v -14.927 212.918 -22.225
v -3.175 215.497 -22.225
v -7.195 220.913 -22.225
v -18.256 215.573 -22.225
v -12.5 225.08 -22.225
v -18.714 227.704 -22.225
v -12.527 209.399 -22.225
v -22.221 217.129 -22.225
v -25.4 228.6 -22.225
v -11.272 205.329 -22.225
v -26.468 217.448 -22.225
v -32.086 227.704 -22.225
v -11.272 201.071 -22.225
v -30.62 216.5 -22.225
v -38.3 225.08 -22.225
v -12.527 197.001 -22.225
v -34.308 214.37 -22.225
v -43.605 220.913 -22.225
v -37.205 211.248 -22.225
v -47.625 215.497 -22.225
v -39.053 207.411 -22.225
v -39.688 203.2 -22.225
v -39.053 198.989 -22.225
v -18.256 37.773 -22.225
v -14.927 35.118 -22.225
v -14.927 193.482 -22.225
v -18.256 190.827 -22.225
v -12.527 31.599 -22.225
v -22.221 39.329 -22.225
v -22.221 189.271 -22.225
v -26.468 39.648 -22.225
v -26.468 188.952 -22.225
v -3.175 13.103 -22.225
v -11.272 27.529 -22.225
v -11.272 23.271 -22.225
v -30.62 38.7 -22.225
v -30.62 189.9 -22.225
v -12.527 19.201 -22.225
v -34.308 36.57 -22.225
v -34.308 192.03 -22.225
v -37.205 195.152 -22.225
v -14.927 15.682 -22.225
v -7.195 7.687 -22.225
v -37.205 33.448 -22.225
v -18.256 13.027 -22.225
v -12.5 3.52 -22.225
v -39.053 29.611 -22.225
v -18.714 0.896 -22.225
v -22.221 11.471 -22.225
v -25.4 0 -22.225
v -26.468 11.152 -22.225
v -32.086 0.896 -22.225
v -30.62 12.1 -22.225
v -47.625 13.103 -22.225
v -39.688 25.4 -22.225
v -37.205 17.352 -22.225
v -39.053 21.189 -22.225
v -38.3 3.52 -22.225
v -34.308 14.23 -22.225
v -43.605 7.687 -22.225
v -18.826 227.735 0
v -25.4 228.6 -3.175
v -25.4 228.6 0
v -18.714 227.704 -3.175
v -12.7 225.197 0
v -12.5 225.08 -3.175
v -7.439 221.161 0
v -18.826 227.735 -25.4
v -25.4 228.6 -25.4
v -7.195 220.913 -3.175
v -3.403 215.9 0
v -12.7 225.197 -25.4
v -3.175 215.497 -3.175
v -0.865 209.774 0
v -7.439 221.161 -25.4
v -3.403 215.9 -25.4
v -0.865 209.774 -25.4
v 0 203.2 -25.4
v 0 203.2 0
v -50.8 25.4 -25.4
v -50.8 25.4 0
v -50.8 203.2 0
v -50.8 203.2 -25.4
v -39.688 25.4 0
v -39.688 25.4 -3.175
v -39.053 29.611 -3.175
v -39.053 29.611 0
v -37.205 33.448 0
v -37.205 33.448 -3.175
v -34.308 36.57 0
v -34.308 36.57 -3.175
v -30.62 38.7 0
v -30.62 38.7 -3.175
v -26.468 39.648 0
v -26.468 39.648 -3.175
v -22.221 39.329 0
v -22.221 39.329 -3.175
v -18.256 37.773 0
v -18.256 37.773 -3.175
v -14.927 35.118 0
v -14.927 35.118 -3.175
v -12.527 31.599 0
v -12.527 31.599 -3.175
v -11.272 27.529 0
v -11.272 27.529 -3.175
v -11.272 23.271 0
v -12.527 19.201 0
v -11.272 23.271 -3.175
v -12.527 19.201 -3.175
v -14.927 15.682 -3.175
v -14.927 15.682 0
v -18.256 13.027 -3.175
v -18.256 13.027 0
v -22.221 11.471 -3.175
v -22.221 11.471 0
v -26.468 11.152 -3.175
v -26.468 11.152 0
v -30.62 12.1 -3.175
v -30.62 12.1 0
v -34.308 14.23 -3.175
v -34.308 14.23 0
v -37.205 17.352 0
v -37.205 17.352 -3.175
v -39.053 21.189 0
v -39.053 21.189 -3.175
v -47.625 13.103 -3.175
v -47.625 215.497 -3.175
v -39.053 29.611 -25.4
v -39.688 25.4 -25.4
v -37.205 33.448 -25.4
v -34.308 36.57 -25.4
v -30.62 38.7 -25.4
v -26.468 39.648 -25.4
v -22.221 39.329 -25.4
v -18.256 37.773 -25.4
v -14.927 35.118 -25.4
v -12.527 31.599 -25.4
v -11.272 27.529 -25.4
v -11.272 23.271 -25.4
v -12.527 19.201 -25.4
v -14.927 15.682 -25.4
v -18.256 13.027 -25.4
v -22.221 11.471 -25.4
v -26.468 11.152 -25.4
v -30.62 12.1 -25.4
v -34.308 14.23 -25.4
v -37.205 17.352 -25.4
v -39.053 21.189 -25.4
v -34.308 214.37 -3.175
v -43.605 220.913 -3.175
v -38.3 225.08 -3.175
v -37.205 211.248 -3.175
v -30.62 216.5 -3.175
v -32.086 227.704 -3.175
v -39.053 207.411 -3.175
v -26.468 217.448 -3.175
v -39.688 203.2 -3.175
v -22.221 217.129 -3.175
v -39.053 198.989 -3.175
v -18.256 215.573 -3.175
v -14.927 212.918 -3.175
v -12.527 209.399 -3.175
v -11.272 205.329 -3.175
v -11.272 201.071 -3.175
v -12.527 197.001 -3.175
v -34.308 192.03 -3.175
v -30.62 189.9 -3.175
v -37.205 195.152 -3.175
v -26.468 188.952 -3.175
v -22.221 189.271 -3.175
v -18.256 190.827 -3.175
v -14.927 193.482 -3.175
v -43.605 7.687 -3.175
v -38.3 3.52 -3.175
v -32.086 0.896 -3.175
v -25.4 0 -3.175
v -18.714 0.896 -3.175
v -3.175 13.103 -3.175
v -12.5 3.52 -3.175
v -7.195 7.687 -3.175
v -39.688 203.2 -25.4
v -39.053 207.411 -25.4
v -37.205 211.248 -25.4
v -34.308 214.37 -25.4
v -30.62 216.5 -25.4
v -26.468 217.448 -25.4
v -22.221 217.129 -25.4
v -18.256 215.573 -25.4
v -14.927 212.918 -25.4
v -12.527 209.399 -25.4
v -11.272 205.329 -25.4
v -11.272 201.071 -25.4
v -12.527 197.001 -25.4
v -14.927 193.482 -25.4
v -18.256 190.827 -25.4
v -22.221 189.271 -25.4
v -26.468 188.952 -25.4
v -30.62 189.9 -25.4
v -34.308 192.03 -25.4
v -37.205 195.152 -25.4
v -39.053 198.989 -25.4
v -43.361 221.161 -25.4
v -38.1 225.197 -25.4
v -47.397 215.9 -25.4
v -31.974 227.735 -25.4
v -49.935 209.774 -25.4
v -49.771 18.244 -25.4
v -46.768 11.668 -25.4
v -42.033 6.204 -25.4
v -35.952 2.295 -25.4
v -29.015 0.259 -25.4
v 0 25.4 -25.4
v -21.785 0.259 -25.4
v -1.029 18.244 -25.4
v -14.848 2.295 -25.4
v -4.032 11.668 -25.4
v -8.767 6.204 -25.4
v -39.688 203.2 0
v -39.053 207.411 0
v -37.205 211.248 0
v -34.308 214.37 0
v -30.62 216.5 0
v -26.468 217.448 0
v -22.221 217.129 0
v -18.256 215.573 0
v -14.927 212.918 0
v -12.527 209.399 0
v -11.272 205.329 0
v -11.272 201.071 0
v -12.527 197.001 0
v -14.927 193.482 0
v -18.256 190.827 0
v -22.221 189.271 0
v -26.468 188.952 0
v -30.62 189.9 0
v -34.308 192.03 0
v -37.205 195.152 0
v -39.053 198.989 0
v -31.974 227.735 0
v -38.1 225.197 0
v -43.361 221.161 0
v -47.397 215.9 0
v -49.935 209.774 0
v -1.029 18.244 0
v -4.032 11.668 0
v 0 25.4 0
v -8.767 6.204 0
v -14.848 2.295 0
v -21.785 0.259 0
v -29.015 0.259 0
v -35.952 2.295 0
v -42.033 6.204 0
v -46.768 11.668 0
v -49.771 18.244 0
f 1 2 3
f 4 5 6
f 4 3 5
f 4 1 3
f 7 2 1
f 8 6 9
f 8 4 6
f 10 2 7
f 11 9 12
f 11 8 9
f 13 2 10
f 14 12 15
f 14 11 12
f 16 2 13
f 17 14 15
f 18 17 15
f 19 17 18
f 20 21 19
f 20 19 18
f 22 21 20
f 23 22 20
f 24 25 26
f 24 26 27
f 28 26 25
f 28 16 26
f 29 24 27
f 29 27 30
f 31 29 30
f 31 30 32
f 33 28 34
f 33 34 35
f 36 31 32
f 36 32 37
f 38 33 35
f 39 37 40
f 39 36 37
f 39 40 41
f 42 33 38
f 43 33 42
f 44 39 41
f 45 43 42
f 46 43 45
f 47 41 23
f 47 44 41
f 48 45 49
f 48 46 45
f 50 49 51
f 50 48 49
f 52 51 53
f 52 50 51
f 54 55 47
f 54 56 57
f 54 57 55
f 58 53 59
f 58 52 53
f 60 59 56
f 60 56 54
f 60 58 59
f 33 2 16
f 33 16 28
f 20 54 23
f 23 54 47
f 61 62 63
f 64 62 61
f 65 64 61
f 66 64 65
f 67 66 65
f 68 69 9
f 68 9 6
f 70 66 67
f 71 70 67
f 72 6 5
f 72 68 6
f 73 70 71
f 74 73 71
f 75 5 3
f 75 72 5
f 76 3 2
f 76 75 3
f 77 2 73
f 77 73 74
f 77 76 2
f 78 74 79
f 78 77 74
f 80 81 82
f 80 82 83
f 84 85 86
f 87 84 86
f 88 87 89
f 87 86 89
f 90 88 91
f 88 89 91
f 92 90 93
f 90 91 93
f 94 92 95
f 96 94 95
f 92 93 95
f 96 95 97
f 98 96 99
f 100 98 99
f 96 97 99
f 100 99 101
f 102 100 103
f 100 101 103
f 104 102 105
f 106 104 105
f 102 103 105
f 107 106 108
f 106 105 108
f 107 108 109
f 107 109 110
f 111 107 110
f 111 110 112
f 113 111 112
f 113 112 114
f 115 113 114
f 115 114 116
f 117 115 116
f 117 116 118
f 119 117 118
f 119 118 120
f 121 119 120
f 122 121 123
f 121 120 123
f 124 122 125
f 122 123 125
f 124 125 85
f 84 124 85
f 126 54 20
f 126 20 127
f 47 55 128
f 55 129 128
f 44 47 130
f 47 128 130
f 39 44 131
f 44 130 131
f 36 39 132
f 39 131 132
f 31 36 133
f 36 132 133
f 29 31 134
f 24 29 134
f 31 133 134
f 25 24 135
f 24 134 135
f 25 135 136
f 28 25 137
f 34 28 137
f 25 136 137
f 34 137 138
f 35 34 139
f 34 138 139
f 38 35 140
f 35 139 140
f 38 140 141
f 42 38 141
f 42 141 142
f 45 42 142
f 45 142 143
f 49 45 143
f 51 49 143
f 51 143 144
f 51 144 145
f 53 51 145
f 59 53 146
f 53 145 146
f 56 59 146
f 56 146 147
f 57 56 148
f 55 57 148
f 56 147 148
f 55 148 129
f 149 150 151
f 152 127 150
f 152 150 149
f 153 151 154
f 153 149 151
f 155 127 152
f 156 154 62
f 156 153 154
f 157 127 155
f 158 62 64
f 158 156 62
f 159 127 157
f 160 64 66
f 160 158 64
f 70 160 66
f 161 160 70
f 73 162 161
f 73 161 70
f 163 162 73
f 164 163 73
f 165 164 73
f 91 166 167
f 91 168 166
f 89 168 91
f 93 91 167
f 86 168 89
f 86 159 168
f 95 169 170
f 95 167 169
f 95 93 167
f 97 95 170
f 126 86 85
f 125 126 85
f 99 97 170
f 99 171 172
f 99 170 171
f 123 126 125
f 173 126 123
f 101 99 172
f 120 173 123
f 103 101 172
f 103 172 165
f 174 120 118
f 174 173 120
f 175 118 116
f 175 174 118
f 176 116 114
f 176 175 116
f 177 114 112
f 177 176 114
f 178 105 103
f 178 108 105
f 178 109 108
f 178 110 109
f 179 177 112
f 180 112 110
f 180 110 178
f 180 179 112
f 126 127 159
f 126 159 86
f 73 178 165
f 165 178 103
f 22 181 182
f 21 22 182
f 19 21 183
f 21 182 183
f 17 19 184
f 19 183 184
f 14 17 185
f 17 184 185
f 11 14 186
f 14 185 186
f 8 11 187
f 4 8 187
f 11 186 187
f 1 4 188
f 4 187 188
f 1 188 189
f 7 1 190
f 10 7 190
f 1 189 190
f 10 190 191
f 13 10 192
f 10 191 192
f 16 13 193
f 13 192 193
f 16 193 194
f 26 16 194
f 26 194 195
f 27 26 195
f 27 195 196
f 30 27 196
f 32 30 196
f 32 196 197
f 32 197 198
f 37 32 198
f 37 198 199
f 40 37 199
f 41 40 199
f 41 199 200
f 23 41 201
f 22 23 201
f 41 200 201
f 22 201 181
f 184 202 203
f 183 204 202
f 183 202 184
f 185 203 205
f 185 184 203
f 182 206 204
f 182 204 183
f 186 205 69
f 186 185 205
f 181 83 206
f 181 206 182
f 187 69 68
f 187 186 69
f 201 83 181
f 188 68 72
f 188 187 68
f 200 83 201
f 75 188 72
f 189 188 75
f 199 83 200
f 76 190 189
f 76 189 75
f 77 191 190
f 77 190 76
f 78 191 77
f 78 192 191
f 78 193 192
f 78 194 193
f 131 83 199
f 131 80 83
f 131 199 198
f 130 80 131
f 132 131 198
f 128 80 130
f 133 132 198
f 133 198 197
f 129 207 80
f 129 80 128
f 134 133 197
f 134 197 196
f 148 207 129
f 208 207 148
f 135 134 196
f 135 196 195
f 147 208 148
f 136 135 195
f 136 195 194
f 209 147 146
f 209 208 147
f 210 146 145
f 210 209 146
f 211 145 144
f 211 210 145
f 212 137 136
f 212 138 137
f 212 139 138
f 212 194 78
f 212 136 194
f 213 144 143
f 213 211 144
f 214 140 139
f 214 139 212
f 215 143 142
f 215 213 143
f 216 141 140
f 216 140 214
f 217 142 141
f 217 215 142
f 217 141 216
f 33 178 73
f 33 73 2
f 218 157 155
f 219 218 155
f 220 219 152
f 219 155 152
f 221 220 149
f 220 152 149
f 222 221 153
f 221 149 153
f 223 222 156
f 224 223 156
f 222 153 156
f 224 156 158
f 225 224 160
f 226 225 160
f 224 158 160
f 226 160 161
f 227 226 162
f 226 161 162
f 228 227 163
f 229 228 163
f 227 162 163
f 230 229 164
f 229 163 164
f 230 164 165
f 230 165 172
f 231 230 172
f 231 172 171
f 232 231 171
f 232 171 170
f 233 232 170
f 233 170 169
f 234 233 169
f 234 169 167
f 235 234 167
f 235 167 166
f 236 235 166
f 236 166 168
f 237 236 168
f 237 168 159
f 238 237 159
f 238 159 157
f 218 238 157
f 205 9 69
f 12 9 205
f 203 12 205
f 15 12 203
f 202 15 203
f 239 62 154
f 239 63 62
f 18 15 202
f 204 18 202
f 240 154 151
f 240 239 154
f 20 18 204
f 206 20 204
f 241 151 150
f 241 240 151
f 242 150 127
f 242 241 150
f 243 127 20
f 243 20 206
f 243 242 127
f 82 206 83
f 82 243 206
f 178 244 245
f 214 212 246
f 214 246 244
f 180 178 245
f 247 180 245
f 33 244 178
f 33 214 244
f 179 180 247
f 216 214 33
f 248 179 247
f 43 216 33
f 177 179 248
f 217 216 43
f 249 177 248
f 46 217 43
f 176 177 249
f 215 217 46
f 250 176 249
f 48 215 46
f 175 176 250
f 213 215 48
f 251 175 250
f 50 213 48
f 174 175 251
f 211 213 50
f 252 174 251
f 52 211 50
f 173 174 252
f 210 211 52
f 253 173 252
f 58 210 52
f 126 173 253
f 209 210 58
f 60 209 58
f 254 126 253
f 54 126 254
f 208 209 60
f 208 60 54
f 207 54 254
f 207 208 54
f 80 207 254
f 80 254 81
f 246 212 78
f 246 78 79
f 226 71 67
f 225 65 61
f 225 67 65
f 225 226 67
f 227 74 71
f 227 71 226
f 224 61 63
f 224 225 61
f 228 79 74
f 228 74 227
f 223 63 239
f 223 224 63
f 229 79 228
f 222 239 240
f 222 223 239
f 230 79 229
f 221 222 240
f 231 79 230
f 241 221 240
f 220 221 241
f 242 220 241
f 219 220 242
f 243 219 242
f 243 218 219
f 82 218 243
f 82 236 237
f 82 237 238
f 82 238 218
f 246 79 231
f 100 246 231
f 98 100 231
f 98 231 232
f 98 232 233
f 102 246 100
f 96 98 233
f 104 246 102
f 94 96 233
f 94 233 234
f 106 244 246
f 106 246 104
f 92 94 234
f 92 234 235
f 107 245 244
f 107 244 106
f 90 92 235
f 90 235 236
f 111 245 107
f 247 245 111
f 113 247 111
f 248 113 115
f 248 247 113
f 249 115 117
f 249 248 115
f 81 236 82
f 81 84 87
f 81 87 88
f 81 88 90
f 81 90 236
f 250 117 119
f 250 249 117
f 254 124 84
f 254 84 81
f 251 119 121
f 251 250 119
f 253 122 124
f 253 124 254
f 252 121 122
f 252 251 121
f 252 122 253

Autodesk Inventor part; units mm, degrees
ref_plane "YZ Plane" through (0, 0, 0) normal (1, 0, 0) x (0, 1, 0)
ref_plane "XZ Plane" through (0, 0, 0) normal (0, 1, 0) x (-1, 0, 0)
ref_plane "XY Plane" through (0, 0, 0) normal (0, 0, 1) x (1, 0, 0)
sketch "Sketch1" plane through (0, 0, 0) normal (0, 1, 0) x (-1, 0, 0)
  line L0 (0, 0) -> (50.8, 0)
  line L1 (50.8, 0) -> (50.8, -25.4)
  line L2 (50.8, -25.4) -> (0, -25.4)
  line L3 (0, -25.4) -> (0, 0)
  line L4 (47.625, -22.225) -> (47.625, -3.175)
  line L5 (47.625, -3.175) -> (3.175, -3.175)
  line L6 (3.175, -3.175) -> (3.175, -22.225)
  line L7 (3.175, -22.225) -> (47.625, -22.225)
  dimension "d0" = 50.8
  dimension "d1" = 25.4
  dimension "d2" = 3.175
extrude "Extrusion1" add sketch "Sketch1" along normal blind 228.6
sketch "Sketch2" plane through (0, 0, -25.4) normal (0, 0, -1) x (-1, 0, 0)
  line L0 (50.8, 0) -> (0, 0) projected
  line L1 (50.8, 0) -> (50.8, 228.6) projected
  line L2 (0, 228.6) -> (50.8, 228.6) projected
  line L3 (0, 0) -> (0, 228.6) projected
  circle A0 centre (25.4, 203.2) radius 14.2875
  circle A1 centre (25.4, 25.4) radius 14.2875
  dimension "d5" = 25.4
  dimension "d6" = 25.4
  dimension "d7" = 28.575
  dimension "d8" = 25.4
  dimension "d9" = 25.4
  dimension "d10" = 28.575
extrude "Extrusion2" cut sketch "Sketch2" against normal through all contours A0 | A1
fillet "Fillet1" radius 25.4 4 edges at (-50.8, 228.6, -12.7) (0, 228.6, -12.7) (-50.8, 0, -12.7) (0, 0, -12.7)
properties part number "WristBarr.ver1-1111-2020"
